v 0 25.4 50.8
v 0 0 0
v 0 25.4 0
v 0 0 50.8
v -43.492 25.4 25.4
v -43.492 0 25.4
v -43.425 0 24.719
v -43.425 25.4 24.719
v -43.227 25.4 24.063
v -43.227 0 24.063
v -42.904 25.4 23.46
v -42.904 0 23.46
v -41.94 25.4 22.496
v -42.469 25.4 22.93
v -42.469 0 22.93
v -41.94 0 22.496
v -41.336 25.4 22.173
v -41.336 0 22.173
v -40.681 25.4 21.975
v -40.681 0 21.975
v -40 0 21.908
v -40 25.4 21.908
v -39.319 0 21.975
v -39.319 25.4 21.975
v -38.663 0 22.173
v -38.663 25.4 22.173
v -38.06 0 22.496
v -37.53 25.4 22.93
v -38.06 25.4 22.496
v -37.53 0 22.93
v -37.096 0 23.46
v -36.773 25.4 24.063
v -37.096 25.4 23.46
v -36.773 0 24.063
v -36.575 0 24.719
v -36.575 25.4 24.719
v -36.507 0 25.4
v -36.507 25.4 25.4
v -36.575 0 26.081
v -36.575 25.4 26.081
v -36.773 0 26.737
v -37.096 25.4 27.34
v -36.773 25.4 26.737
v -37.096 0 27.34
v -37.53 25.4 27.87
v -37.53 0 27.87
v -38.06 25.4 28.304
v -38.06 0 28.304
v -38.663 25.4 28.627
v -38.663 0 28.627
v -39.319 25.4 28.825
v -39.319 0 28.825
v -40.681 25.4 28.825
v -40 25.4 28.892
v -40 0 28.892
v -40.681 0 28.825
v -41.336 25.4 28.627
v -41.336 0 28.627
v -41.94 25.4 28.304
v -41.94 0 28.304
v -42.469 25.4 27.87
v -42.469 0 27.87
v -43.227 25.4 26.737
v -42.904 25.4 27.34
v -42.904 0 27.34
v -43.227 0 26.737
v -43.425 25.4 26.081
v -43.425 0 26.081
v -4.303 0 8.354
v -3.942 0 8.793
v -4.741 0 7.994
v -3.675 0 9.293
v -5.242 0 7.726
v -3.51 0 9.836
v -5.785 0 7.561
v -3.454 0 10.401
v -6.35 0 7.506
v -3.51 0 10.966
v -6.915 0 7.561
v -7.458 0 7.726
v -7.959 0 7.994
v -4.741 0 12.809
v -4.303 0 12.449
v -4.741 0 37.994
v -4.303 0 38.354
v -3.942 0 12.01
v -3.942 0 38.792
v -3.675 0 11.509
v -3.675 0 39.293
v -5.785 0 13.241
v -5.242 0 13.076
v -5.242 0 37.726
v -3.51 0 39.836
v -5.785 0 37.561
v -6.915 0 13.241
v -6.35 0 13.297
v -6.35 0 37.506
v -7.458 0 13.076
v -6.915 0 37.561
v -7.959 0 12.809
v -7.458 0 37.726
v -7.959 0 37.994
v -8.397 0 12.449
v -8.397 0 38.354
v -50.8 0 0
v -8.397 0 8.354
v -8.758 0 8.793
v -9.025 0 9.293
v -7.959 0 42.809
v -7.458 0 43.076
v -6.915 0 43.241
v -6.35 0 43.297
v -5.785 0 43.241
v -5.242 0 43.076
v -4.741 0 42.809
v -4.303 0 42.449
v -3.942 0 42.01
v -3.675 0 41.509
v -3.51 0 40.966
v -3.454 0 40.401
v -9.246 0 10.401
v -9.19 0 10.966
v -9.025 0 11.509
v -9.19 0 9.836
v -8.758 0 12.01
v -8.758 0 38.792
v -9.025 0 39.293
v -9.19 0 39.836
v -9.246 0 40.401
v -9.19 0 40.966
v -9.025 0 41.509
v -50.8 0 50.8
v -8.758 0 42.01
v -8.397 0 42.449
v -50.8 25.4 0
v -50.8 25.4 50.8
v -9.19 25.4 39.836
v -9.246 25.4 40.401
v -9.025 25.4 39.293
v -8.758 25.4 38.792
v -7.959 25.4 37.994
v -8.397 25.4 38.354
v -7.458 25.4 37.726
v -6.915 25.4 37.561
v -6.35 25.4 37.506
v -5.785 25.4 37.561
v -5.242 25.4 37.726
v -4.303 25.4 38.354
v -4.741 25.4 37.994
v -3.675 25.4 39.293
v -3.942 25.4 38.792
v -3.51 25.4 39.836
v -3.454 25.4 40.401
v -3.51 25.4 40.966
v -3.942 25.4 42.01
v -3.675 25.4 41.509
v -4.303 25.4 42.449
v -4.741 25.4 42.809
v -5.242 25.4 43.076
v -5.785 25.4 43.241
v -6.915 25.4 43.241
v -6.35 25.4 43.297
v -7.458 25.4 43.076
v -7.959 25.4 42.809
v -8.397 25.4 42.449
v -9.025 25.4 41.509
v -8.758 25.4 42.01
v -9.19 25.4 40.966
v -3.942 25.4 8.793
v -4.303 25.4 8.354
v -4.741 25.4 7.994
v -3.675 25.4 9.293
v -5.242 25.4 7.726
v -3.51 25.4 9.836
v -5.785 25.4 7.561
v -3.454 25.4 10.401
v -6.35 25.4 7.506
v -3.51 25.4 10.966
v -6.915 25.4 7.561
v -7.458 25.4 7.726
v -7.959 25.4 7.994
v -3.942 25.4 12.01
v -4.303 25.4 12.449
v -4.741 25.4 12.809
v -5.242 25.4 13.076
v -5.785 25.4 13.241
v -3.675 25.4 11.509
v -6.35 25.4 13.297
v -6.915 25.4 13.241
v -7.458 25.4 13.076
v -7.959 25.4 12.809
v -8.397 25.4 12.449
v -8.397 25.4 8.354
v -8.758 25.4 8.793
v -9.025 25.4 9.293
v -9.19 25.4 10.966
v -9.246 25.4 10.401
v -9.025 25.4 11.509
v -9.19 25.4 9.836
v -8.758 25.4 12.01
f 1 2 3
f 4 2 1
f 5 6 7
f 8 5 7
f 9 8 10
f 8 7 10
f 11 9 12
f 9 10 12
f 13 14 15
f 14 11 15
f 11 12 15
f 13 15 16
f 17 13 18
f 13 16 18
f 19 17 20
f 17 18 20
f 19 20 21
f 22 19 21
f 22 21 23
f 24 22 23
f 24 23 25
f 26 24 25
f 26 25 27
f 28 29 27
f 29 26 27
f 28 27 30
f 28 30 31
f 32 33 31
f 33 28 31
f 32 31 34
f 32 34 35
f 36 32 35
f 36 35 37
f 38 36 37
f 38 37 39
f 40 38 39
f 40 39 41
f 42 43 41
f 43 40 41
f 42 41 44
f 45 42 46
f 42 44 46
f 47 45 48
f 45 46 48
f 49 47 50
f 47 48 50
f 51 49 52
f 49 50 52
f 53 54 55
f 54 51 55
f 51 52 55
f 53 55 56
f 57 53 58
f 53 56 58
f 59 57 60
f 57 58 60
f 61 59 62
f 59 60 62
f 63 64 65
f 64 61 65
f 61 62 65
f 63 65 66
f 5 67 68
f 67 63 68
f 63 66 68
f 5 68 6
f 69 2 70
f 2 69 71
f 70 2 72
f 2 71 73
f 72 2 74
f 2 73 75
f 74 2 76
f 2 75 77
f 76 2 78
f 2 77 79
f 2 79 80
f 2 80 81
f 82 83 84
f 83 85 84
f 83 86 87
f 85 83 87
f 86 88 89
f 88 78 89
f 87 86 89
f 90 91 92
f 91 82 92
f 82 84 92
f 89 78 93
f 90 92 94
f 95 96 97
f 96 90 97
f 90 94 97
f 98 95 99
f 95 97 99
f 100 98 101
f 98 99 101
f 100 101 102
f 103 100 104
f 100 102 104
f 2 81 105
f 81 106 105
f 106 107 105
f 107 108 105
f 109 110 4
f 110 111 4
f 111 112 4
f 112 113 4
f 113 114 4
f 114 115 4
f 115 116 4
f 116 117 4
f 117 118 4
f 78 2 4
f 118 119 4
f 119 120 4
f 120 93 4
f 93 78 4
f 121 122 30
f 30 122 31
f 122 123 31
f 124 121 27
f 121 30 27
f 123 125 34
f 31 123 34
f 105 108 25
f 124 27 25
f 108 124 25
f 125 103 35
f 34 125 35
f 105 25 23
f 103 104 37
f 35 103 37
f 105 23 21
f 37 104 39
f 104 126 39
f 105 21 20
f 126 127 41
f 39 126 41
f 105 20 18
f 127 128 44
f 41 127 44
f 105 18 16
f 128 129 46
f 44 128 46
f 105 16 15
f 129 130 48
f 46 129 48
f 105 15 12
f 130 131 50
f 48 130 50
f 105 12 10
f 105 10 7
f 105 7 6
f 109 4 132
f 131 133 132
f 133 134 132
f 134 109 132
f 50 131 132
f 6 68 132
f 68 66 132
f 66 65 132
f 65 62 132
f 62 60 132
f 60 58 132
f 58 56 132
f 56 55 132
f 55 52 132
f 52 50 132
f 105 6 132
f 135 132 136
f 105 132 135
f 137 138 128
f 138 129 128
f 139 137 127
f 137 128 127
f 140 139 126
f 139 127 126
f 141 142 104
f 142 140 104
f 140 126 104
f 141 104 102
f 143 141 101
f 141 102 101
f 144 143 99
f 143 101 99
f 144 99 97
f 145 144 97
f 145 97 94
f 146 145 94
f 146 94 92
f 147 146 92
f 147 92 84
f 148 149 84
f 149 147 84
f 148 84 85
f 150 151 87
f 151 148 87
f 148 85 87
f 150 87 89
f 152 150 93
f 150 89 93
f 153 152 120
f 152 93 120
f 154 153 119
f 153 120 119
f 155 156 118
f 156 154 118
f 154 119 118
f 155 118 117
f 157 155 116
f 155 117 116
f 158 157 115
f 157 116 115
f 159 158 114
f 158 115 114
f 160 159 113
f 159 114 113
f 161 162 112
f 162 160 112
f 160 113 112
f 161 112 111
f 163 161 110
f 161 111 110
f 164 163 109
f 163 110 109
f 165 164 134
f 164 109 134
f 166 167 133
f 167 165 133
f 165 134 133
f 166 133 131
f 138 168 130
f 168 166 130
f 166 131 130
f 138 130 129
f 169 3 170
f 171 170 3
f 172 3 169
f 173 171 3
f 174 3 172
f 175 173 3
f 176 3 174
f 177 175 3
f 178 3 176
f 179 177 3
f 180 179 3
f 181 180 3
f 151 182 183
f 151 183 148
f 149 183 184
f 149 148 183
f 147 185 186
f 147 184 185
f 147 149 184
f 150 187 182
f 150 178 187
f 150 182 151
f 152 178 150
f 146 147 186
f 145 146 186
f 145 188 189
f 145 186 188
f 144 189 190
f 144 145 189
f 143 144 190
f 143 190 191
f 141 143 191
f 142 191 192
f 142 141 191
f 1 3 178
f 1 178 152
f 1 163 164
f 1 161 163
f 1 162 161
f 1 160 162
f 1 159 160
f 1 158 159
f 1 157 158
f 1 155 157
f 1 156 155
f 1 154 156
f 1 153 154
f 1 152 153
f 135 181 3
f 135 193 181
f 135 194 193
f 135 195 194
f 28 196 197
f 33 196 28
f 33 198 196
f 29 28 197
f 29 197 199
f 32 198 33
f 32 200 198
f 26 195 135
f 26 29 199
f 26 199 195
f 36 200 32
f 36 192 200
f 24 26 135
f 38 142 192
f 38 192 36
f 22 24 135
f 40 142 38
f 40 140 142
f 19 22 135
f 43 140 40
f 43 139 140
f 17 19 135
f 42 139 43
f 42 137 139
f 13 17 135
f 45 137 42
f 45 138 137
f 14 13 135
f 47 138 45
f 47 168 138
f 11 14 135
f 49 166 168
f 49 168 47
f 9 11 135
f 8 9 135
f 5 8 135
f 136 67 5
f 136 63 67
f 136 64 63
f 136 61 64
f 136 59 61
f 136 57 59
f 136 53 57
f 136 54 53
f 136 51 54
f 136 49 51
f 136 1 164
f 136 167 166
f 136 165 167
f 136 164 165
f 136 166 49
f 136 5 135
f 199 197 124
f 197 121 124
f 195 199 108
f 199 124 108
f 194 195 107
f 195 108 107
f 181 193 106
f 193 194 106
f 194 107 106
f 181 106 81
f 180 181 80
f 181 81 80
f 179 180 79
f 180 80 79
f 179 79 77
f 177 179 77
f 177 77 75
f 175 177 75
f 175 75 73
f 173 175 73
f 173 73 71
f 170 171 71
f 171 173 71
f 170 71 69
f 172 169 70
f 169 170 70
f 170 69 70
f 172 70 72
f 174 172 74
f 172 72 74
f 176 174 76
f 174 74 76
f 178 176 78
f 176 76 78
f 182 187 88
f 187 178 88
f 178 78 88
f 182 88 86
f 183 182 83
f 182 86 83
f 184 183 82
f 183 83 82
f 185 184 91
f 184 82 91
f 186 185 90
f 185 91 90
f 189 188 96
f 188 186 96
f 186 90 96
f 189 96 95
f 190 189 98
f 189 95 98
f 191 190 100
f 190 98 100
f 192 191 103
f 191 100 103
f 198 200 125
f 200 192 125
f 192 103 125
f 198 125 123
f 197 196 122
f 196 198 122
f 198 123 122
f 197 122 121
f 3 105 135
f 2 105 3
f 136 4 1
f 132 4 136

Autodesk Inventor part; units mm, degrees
ref_plane "YZ Plane" through (0, 0, 0) normal (1, 0, 0) x (0, 1, 0)
ref_plane "XZ Plane" through (0, 0, 0) normal (0, 1, 0) x (-1, 0, 0)
ref_plane "XY Plane" through (0, 0, 0) normal (0, 0, 1) x (1, 0, 0)
sketch "Sketch1" plane through (0, 0, 0) normal (0, 1, 0) x (-1, 0, 0)
  line L0 (0, 0) -> (0, 50.8)
  line L1 (0, 50.8) -> (50.8, 50.8)
  line L2 (50.8, 50.8) -> (50.8, 0)
  line L3 (50.8, 0) -> (0, 0)
  circle A0 centre (6.35, 40.4012) radius 2.8956
  circle A1 centre (6.35, 10.4013) radius 2.8956
  circle A2 centre (39.9999, 25.4) radius 3.4925
  dimension "d0" = 50.8
  dimension "d1" = 50.8
  dimension "d2" = 5.7912
  dimension "d3" = 5.7912
  dimension "d4" = 29.9999
  dimension "d5" = 10.4013
  dimension "d6" = 6.35
  dimension "d7" = 6.35
  dimension "d8" = 6.985
  dimension "d9" = 39.9999
  dimension "d10" = 25.4
extrude "Extrusion1" add sketch "Sketch1" along normal blind 25.4
properties part number "SpoutHolder"
